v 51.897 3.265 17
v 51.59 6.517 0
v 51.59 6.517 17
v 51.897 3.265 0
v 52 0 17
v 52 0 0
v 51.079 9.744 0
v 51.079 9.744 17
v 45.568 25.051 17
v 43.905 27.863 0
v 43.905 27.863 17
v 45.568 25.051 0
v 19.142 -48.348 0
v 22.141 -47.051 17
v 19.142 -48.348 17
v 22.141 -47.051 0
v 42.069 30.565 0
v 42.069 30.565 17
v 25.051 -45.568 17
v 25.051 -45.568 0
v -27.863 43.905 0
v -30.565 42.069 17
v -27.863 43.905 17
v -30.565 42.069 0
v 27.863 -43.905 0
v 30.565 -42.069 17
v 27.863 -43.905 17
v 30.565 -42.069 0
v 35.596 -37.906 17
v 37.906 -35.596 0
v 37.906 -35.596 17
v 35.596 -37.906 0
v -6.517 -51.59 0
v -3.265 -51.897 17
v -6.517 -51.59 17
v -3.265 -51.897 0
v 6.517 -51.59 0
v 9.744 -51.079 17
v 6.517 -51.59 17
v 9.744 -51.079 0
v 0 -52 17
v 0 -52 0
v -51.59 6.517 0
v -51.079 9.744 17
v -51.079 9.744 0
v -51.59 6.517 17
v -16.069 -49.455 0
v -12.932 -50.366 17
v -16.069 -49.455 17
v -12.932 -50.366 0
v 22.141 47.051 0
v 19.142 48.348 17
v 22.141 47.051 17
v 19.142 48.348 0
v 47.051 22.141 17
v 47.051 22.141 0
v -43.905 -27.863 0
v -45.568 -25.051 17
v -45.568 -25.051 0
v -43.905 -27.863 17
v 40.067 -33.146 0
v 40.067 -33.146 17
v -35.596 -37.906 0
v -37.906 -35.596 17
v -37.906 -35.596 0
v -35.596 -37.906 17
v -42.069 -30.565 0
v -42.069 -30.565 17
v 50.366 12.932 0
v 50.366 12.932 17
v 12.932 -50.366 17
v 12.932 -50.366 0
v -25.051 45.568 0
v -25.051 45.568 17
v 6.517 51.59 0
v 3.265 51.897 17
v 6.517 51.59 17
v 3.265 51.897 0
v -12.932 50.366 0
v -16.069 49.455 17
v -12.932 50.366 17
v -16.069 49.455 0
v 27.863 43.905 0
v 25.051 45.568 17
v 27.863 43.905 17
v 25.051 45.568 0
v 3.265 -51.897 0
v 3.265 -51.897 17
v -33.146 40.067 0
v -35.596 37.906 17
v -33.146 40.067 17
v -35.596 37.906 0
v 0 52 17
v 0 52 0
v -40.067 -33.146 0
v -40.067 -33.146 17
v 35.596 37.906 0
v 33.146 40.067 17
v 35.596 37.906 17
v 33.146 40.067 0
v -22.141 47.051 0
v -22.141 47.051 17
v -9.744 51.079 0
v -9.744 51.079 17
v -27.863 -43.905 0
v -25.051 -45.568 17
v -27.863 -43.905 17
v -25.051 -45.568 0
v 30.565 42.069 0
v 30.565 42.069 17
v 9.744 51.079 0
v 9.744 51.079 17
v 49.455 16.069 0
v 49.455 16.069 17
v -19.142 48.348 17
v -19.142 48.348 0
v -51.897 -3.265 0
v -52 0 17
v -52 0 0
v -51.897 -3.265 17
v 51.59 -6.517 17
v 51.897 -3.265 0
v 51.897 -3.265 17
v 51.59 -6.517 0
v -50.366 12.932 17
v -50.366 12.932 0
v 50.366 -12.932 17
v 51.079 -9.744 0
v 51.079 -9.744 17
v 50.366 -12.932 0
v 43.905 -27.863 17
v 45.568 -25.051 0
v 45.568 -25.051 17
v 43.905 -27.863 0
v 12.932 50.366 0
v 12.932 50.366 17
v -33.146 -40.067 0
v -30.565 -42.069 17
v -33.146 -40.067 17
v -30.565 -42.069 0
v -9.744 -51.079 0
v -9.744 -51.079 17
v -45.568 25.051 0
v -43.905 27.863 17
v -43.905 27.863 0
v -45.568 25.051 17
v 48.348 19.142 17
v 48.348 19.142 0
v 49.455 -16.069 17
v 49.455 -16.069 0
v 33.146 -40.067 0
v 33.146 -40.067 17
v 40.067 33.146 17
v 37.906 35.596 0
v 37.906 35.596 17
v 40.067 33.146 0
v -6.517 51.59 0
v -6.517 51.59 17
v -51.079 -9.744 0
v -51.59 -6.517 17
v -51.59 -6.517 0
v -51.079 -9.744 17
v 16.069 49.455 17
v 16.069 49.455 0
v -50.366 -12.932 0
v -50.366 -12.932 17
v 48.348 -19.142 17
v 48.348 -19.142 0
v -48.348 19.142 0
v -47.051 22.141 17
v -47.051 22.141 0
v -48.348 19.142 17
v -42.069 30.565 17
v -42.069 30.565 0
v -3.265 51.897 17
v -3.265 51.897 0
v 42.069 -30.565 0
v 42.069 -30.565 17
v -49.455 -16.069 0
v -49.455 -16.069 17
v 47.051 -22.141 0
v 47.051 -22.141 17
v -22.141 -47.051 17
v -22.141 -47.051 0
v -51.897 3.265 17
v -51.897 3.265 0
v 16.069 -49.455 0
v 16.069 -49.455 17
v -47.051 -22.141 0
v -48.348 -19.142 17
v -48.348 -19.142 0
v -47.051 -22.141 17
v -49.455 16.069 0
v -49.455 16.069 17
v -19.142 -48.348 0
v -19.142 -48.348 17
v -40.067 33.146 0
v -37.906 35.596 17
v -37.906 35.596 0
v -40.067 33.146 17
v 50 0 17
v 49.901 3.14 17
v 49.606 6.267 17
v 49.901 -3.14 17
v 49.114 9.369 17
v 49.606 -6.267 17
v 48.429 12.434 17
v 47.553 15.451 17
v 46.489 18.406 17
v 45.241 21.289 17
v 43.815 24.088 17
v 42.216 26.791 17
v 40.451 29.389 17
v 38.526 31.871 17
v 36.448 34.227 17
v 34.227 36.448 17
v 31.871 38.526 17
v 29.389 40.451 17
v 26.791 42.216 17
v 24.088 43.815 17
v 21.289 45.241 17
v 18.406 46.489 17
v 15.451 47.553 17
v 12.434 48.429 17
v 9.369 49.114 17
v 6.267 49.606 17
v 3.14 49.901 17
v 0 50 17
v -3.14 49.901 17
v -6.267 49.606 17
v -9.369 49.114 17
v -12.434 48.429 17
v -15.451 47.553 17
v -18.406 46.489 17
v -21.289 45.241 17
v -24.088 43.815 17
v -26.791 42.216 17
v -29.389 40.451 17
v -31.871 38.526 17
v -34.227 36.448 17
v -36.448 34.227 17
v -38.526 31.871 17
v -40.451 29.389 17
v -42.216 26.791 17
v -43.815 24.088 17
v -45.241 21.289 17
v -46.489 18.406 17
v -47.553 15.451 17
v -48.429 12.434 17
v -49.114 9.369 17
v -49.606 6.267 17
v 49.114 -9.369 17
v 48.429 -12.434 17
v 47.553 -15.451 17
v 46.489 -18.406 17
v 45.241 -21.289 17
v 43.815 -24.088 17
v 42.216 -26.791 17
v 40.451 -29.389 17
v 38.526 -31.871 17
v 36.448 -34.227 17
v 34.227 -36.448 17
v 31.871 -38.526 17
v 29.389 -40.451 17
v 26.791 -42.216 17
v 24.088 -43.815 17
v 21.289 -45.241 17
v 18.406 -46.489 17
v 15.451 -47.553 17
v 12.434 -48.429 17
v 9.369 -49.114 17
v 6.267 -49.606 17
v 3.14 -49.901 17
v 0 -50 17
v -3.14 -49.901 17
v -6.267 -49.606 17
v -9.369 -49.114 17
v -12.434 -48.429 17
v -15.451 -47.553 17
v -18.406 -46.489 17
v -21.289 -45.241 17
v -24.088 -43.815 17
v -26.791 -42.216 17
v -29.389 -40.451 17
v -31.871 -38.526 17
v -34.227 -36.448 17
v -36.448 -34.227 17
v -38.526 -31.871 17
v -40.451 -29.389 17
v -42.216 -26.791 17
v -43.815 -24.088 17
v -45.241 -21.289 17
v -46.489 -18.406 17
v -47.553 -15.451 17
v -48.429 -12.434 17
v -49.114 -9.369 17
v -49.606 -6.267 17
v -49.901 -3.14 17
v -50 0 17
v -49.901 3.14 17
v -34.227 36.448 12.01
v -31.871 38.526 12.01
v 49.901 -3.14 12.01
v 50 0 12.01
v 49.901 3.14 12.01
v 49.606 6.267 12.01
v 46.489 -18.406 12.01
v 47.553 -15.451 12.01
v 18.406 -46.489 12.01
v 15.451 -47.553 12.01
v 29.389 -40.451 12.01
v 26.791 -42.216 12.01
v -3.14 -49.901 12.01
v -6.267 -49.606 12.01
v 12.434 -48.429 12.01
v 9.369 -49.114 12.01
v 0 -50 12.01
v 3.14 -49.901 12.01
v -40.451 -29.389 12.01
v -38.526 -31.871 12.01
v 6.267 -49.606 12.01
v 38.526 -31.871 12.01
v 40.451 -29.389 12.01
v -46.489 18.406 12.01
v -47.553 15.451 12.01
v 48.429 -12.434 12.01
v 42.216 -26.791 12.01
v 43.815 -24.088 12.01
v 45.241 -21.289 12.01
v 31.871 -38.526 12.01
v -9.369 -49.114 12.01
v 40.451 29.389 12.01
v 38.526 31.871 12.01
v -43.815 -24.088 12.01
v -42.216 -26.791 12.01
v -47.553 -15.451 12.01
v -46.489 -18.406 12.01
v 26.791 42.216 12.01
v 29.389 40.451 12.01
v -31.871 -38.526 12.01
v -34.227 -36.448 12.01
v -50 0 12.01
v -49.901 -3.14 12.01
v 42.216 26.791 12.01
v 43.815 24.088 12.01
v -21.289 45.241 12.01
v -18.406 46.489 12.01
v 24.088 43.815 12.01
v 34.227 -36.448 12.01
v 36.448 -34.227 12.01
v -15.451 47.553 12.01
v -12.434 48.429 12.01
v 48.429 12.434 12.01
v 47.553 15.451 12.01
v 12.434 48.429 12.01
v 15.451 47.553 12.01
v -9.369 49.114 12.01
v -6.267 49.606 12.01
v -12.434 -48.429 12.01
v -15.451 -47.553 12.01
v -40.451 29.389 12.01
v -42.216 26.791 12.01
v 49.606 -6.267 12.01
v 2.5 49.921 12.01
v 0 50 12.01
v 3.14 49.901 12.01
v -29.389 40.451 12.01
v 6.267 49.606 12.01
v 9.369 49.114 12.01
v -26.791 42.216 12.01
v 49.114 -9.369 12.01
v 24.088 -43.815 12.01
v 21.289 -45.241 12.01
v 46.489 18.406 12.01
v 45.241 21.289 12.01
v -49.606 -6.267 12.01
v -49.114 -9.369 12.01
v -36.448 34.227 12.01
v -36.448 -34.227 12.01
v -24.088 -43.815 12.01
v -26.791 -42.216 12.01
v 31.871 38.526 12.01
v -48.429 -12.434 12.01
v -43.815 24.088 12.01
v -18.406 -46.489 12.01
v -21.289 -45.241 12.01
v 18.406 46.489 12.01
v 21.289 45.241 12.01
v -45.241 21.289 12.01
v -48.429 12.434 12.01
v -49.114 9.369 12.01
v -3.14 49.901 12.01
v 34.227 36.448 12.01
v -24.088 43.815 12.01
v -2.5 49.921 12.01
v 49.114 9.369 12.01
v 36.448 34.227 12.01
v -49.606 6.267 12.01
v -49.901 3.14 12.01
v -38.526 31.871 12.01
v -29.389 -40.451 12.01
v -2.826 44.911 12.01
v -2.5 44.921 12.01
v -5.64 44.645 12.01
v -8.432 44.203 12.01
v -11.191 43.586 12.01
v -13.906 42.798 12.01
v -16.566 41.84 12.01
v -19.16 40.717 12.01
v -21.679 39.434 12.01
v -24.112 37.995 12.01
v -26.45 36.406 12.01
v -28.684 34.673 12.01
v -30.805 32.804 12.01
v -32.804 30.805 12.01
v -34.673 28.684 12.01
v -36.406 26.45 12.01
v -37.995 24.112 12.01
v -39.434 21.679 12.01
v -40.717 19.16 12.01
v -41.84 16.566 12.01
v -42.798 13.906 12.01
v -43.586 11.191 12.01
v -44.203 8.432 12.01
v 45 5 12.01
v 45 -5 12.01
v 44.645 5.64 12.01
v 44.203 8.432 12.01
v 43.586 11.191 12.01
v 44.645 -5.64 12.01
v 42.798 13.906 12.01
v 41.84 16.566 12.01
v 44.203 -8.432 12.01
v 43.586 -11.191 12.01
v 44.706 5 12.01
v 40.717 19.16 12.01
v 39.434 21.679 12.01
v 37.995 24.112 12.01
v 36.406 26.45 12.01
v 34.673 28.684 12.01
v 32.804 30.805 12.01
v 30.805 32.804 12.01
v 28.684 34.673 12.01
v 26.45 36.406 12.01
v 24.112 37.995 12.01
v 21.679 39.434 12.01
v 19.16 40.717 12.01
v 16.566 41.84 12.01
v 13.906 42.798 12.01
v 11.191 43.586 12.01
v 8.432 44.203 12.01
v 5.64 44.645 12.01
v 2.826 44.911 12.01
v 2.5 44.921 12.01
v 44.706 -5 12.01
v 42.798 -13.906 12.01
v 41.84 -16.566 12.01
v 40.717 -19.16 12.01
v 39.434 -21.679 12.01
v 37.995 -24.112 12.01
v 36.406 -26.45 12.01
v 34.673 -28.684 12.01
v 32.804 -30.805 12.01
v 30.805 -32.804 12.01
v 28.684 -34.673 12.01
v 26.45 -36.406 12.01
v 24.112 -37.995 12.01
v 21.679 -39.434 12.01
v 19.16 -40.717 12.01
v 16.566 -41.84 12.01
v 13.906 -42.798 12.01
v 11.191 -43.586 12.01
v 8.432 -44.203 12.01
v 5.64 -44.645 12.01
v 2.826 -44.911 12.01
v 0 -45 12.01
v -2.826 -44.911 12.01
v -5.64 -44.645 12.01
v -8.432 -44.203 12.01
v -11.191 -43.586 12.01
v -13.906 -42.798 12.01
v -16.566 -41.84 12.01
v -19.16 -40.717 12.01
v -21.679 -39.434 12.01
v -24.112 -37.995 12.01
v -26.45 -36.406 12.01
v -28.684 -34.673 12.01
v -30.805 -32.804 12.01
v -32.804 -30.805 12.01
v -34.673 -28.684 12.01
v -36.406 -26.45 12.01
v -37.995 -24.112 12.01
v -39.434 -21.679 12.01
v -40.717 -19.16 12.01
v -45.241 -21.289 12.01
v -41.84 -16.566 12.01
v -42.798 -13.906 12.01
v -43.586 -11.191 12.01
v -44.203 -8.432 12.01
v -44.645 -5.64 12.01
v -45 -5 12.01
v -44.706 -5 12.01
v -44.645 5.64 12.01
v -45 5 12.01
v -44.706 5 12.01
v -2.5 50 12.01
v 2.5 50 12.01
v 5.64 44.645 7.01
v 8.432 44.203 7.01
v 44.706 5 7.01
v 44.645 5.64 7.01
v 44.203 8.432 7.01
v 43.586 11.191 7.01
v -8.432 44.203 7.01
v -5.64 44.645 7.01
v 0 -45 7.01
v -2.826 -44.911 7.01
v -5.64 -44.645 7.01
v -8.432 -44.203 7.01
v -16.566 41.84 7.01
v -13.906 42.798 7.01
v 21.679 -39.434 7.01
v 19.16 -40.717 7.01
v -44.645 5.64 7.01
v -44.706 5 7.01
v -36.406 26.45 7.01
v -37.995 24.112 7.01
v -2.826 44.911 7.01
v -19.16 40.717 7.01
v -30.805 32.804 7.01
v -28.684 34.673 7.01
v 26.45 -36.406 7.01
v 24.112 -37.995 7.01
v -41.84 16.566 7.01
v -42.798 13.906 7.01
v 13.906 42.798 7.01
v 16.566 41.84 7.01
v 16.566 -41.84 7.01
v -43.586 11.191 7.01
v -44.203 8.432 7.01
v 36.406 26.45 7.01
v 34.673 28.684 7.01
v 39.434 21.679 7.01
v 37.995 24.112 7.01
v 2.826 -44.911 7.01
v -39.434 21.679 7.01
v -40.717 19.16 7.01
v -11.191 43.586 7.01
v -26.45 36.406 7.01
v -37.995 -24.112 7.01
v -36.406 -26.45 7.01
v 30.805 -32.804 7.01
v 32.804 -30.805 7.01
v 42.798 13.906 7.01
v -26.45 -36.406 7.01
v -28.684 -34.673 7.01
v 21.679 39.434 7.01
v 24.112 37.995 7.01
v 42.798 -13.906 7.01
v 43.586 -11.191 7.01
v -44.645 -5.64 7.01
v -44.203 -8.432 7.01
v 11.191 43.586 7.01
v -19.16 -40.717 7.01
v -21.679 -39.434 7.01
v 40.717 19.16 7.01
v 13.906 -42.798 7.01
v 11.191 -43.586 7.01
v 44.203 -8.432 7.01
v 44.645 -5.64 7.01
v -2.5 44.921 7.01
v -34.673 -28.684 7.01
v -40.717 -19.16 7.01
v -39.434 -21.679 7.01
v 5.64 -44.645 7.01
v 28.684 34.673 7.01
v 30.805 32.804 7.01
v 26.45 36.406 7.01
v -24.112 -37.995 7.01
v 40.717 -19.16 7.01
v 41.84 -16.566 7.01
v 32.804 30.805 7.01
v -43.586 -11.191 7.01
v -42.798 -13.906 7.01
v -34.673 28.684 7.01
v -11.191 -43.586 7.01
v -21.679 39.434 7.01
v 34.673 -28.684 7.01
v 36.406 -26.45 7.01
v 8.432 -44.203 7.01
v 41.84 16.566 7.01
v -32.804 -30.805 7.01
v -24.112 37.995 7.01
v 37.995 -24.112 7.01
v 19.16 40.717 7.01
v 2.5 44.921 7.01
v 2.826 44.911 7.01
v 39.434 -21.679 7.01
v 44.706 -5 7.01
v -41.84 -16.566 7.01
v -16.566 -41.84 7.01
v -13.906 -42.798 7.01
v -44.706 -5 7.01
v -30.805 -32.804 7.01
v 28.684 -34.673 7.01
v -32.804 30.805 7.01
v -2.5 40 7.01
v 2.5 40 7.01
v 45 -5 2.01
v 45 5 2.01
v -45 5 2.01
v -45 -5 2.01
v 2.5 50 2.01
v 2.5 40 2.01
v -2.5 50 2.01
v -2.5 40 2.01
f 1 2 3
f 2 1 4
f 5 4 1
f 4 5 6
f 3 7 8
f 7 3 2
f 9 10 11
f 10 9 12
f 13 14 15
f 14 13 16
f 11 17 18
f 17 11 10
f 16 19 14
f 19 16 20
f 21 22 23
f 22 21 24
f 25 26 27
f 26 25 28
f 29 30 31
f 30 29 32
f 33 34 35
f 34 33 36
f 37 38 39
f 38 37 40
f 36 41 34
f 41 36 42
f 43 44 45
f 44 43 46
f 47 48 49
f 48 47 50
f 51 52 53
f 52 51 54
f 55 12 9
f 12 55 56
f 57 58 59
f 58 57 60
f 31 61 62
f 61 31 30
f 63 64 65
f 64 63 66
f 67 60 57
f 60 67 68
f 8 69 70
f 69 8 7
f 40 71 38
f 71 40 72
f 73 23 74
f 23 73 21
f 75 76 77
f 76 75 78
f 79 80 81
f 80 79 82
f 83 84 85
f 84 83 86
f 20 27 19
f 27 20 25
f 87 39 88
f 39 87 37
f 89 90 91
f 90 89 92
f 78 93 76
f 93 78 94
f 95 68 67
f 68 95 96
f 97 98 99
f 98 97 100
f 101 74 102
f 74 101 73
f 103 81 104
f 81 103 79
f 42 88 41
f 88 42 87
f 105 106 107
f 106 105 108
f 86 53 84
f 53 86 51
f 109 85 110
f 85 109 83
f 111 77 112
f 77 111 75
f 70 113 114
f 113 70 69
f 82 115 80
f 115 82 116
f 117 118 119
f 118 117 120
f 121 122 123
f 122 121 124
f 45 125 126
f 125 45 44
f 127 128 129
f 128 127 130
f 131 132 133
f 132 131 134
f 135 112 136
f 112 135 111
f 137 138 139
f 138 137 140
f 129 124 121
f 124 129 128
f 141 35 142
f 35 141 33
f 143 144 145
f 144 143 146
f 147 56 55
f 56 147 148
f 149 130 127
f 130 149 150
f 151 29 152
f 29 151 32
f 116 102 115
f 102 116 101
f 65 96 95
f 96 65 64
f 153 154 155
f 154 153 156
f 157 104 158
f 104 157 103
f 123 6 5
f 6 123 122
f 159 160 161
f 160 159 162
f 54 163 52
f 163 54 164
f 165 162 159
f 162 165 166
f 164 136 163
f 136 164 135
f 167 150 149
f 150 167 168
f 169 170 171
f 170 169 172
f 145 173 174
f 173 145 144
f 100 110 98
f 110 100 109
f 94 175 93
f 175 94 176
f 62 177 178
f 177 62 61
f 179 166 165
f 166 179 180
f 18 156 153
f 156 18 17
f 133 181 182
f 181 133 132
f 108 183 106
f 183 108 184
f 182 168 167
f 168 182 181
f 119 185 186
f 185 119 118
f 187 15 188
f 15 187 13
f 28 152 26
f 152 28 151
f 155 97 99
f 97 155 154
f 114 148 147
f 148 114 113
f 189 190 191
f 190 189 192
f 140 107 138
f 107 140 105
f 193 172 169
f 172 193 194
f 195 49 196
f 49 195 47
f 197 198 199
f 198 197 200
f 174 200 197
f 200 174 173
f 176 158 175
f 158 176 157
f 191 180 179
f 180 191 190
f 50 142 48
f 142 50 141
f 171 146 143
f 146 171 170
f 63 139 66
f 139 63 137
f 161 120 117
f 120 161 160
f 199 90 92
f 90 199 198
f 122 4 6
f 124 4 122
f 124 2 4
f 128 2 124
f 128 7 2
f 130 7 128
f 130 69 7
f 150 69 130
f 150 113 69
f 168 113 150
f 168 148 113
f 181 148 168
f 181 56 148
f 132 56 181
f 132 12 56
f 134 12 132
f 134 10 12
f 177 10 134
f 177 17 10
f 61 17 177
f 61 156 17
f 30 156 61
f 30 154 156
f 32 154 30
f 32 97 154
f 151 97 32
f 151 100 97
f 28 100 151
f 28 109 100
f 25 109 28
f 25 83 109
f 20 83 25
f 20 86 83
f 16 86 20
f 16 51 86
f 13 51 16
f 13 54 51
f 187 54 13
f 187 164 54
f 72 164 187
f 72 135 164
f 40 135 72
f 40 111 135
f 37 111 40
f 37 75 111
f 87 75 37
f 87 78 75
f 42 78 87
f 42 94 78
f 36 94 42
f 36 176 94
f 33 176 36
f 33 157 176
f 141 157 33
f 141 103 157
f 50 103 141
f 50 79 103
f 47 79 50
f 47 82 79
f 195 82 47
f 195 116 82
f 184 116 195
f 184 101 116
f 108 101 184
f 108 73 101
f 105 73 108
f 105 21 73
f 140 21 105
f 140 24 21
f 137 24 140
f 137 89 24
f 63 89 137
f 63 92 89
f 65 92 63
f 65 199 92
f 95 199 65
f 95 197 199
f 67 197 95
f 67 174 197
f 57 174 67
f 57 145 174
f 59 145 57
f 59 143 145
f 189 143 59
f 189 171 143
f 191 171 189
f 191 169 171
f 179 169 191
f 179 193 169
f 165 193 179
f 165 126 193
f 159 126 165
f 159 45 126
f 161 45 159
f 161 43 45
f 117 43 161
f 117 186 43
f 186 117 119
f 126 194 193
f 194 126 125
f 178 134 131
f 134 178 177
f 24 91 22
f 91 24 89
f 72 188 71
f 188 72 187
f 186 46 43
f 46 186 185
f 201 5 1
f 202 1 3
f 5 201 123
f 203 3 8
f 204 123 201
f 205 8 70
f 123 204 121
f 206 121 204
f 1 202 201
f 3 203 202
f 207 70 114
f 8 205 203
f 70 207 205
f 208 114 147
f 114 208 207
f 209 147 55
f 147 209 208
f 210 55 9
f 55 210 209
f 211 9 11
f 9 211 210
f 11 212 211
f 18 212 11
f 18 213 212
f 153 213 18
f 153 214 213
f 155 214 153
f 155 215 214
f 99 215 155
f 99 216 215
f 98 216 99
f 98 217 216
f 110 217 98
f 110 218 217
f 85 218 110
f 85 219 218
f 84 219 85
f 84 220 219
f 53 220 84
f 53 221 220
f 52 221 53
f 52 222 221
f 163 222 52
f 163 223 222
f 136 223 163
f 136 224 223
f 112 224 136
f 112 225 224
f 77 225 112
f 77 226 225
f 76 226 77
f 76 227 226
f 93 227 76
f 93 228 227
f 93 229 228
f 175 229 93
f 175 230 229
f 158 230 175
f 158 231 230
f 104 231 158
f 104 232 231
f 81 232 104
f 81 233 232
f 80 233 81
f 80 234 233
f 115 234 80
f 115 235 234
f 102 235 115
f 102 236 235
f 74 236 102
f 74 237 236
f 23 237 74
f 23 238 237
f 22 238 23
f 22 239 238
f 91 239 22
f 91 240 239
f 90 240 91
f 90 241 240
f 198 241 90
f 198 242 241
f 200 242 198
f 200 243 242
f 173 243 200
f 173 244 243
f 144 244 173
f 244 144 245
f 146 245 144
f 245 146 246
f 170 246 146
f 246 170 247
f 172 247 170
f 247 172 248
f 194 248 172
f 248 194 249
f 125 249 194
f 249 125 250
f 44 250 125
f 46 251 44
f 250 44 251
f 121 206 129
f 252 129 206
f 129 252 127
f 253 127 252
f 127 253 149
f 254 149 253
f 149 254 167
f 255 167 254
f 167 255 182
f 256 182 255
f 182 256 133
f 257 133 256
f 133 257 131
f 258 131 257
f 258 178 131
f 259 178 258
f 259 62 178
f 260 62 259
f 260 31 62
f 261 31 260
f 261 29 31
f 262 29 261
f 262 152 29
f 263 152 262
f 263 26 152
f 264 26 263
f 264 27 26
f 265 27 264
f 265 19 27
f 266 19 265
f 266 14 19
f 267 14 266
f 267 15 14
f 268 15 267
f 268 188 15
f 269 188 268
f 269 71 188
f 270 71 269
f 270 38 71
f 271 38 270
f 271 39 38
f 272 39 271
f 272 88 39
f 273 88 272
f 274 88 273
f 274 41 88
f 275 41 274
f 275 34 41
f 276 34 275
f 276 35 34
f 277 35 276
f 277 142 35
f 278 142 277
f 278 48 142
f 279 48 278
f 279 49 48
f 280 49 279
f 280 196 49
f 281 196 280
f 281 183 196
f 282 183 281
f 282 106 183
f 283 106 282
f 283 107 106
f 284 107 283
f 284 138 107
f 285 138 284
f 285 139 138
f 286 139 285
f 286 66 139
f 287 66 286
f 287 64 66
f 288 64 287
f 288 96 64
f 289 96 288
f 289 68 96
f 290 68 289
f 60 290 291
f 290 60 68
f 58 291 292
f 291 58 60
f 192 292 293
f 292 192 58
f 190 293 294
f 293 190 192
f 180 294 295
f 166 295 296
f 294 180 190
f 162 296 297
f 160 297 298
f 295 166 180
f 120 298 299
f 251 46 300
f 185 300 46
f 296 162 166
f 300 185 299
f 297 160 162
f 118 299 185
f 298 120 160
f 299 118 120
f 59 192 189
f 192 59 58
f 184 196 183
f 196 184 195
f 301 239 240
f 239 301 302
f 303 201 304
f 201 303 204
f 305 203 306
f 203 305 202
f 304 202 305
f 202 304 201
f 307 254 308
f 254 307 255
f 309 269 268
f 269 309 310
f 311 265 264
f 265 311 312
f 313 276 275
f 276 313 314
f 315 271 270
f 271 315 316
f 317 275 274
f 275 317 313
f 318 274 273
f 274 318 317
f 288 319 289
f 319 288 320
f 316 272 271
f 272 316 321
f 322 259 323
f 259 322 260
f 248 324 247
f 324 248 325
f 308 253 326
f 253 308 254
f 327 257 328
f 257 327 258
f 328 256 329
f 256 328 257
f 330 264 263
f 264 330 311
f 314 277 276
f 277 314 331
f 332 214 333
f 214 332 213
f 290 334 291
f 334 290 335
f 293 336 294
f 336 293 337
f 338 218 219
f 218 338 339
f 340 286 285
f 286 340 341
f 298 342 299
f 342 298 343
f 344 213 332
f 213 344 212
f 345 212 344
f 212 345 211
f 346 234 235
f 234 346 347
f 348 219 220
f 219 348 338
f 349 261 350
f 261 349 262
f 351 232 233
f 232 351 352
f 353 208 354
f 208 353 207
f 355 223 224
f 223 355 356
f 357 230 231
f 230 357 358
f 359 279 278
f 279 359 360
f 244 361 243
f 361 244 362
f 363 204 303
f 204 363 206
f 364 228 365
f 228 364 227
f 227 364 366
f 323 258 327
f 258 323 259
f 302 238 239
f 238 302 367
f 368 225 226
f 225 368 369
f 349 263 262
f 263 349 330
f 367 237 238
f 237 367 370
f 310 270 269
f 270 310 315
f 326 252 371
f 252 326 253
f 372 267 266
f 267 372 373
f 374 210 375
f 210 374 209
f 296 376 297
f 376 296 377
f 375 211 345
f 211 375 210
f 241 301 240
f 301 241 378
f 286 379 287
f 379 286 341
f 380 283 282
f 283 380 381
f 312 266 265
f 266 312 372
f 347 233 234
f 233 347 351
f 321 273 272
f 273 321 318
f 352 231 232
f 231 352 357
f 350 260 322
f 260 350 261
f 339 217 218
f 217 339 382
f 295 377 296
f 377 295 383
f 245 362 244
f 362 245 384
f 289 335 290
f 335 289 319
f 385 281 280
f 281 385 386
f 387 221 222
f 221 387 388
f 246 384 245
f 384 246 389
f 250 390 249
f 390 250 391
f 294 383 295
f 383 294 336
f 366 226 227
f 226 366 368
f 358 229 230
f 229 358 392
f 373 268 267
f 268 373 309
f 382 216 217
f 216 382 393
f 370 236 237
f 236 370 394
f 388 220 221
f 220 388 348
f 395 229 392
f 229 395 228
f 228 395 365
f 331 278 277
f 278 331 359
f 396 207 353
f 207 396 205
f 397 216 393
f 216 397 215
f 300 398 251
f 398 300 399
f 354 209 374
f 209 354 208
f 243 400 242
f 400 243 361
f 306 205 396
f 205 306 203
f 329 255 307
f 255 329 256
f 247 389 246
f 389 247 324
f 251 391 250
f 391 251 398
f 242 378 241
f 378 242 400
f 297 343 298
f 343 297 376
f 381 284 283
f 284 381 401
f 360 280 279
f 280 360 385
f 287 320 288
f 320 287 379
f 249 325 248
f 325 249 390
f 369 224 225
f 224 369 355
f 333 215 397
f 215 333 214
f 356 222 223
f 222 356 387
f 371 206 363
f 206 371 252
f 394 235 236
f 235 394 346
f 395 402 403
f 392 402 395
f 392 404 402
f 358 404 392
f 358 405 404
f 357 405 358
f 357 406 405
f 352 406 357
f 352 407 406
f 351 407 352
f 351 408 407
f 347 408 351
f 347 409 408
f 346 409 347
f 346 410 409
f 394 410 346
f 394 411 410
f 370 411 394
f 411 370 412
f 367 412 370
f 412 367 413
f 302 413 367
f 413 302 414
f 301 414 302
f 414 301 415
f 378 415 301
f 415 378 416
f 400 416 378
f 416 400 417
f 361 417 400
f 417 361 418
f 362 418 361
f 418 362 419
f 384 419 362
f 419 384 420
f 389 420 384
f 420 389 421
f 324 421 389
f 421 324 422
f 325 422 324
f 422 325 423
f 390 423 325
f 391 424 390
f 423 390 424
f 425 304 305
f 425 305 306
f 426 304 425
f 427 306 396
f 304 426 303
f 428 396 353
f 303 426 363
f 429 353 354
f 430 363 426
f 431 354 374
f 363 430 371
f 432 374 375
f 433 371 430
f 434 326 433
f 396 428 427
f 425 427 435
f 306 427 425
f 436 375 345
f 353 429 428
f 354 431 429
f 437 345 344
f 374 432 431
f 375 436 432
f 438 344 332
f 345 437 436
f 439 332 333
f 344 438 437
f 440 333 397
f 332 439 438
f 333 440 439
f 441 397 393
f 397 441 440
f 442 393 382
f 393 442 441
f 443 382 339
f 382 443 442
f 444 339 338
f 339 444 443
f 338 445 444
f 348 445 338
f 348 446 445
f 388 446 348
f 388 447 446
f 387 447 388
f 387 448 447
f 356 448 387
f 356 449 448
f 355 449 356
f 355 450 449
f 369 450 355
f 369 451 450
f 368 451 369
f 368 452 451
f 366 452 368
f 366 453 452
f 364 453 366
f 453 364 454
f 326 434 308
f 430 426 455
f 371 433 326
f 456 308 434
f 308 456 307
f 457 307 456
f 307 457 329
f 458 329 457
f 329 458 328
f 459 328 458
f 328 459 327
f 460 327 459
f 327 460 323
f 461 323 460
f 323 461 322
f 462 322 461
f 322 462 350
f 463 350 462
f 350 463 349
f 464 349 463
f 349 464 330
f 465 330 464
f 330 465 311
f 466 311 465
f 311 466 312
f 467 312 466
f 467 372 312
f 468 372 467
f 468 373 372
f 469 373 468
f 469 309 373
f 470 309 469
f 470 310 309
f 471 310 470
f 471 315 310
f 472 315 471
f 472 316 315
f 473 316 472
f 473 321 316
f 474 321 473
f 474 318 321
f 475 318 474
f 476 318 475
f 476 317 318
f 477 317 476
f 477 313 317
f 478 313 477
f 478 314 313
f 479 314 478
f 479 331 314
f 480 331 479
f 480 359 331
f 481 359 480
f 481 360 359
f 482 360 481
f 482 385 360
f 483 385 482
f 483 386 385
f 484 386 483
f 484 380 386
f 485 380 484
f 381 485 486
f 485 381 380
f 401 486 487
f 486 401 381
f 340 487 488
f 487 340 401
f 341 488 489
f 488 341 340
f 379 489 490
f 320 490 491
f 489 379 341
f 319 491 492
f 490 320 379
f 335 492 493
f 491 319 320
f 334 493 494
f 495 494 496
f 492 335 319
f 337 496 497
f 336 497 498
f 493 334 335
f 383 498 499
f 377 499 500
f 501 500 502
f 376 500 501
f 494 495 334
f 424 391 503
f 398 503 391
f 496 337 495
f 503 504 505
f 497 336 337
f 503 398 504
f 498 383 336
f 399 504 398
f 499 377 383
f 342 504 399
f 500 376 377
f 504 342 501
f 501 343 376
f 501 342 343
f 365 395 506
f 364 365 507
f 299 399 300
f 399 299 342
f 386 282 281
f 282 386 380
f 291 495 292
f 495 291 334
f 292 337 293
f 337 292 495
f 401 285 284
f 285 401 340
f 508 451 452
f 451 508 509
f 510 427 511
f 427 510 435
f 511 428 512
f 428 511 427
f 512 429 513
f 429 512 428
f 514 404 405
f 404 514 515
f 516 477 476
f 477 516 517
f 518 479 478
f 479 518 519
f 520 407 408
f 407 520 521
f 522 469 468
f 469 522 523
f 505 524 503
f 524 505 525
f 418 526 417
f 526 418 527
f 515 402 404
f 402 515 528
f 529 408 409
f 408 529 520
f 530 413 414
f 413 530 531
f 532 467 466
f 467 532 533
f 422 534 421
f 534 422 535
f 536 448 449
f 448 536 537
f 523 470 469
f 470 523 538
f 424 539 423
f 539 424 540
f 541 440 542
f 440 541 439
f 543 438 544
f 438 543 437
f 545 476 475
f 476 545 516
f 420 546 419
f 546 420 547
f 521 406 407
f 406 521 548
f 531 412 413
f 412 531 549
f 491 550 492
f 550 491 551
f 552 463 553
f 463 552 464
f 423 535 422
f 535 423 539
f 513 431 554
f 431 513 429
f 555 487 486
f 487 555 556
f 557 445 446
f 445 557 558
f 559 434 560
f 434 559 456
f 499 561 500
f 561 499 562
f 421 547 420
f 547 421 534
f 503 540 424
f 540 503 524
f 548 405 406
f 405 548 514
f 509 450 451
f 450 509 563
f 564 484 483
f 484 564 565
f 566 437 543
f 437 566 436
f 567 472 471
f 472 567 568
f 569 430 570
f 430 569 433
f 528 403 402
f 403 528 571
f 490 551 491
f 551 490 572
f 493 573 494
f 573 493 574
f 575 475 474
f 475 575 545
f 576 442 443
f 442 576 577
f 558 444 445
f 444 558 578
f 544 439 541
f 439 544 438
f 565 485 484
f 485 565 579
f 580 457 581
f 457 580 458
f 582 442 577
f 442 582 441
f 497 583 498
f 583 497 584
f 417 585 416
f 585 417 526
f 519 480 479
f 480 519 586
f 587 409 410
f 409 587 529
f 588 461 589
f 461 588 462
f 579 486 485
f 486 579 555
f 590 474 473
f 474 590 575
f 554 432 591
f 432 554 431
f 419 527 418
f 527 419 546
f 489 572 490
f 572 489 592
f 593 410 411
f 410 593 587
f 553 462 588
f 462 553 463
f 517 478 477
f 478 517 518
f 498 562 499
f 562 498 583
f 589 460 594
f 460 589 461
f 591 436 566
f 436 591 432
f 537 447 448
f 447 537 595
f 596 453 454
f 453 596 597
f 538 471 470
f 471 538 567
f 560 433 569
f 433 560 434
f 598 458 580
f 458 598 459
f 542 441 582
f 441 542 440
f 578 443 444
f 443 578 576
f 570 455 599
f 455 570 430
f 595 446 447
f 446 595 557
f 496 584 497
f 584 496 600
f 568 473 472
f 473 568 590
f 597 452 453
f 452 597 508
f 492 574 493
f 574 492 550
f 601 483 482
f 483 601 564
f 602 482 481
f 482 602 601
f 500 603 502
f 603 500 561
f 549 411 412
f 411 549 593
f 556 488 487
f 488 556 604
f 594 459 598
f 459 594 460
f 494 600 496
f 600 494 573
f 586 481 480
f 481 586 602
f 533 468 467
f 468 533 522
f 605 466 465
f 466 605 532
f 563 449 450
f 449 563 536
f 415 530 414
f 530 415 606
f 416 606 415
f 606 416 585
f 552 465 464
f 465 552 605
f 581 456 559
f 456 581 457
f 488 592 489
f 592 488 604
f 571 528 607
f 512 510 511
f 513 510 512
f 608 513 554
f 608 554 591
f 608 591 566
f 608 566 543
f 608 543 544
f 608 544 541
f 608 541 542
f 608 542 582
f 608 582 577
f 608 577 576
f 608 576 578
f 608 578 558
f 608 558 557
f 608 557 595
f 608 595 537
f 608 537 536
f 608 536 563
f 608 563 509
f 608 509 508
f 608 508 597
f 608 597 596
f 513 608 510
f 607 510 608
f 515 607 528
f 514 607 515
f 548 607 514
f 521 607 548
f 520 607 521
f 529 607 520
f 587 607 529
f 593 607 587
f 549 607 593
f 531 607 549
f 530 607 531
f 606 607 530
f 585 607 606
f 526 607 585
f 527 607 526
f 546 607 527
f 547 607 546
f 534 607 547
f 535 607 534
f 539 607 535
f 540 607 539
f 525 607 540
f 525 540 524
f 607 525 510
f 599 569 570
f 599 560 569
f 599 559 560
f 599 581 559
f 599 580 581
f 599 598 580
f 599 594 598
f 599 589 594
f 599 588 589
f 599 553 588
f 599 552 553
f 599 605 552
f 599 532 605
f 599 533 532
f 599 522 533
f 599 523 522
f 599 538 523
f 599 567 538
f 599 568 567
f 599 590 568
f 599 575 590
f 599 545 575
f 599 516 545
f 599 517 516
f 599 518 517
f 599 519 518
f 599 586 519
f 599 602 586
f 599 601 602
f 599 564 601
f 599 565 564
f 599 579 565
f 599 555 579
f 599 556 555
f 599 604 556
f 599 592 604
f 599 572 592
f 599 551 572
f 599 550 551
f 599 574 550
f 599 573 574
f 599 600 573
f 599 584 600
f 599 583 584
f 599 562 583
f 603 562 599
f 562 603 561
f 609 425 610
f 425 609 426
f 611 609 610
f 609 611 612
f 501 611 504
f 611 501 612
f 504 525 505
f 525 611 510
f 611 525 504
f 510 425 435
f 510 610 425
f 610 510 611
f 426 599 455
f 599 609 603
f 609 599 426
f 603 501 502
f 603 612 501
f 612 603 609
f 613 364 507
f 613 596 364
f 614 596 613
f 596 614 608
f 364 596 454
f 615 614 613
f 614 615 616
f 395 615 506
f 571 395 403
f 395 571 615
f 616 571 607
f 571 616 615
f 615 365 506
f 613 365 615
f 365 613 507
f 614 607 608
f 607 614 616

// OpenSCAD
diametre_couvercle = 100;
hauteur_couvercle = 5;
hauteur_support_batterie = 10;
longueur_support_batterie = 90;
largeur_support_batterie = 10;
epaisseur = 2;
longueur_ci_charge = 10;
largeur_ci_charge = 5;


module couvercle() {
    difference(){
        cylinder(d=diametre_couvercle+2*epaisseur, h=hauteur_couvercle+hauteur_support_batterie+epaisseur, $fn=100);
        translate([0,0,hauteur_support_batterie+epaisseur+0.01])
        cylinder(d=diametre_couvercle, h=hauteur_couvercle, $fn=100);
        translate([0,0,hauteur_support_batterie+epaisseur-hauteur_couvercle+0.01])
        cylinder(d=diametre_couvercle-10, h=hauteur_couvercle, $fn=100);
    
    translate([0,0,hauteur_support_batterie/2+epaisseur+0.01])
        #cube([longueur_support_batterie,largeur_support_batterie,hauteur_support_batterie], center=true);
        
    translate([0,(diametre_couvercle-longueur_ci_charge)/2,hauteur_support_batterie/2+epaisseur+0.01])    #cube([largeur_ci_charge,longueur_ci_charge,hauteur_support_batterie], center=true);
    }
}

module switch(){
    
}

couvercle();
